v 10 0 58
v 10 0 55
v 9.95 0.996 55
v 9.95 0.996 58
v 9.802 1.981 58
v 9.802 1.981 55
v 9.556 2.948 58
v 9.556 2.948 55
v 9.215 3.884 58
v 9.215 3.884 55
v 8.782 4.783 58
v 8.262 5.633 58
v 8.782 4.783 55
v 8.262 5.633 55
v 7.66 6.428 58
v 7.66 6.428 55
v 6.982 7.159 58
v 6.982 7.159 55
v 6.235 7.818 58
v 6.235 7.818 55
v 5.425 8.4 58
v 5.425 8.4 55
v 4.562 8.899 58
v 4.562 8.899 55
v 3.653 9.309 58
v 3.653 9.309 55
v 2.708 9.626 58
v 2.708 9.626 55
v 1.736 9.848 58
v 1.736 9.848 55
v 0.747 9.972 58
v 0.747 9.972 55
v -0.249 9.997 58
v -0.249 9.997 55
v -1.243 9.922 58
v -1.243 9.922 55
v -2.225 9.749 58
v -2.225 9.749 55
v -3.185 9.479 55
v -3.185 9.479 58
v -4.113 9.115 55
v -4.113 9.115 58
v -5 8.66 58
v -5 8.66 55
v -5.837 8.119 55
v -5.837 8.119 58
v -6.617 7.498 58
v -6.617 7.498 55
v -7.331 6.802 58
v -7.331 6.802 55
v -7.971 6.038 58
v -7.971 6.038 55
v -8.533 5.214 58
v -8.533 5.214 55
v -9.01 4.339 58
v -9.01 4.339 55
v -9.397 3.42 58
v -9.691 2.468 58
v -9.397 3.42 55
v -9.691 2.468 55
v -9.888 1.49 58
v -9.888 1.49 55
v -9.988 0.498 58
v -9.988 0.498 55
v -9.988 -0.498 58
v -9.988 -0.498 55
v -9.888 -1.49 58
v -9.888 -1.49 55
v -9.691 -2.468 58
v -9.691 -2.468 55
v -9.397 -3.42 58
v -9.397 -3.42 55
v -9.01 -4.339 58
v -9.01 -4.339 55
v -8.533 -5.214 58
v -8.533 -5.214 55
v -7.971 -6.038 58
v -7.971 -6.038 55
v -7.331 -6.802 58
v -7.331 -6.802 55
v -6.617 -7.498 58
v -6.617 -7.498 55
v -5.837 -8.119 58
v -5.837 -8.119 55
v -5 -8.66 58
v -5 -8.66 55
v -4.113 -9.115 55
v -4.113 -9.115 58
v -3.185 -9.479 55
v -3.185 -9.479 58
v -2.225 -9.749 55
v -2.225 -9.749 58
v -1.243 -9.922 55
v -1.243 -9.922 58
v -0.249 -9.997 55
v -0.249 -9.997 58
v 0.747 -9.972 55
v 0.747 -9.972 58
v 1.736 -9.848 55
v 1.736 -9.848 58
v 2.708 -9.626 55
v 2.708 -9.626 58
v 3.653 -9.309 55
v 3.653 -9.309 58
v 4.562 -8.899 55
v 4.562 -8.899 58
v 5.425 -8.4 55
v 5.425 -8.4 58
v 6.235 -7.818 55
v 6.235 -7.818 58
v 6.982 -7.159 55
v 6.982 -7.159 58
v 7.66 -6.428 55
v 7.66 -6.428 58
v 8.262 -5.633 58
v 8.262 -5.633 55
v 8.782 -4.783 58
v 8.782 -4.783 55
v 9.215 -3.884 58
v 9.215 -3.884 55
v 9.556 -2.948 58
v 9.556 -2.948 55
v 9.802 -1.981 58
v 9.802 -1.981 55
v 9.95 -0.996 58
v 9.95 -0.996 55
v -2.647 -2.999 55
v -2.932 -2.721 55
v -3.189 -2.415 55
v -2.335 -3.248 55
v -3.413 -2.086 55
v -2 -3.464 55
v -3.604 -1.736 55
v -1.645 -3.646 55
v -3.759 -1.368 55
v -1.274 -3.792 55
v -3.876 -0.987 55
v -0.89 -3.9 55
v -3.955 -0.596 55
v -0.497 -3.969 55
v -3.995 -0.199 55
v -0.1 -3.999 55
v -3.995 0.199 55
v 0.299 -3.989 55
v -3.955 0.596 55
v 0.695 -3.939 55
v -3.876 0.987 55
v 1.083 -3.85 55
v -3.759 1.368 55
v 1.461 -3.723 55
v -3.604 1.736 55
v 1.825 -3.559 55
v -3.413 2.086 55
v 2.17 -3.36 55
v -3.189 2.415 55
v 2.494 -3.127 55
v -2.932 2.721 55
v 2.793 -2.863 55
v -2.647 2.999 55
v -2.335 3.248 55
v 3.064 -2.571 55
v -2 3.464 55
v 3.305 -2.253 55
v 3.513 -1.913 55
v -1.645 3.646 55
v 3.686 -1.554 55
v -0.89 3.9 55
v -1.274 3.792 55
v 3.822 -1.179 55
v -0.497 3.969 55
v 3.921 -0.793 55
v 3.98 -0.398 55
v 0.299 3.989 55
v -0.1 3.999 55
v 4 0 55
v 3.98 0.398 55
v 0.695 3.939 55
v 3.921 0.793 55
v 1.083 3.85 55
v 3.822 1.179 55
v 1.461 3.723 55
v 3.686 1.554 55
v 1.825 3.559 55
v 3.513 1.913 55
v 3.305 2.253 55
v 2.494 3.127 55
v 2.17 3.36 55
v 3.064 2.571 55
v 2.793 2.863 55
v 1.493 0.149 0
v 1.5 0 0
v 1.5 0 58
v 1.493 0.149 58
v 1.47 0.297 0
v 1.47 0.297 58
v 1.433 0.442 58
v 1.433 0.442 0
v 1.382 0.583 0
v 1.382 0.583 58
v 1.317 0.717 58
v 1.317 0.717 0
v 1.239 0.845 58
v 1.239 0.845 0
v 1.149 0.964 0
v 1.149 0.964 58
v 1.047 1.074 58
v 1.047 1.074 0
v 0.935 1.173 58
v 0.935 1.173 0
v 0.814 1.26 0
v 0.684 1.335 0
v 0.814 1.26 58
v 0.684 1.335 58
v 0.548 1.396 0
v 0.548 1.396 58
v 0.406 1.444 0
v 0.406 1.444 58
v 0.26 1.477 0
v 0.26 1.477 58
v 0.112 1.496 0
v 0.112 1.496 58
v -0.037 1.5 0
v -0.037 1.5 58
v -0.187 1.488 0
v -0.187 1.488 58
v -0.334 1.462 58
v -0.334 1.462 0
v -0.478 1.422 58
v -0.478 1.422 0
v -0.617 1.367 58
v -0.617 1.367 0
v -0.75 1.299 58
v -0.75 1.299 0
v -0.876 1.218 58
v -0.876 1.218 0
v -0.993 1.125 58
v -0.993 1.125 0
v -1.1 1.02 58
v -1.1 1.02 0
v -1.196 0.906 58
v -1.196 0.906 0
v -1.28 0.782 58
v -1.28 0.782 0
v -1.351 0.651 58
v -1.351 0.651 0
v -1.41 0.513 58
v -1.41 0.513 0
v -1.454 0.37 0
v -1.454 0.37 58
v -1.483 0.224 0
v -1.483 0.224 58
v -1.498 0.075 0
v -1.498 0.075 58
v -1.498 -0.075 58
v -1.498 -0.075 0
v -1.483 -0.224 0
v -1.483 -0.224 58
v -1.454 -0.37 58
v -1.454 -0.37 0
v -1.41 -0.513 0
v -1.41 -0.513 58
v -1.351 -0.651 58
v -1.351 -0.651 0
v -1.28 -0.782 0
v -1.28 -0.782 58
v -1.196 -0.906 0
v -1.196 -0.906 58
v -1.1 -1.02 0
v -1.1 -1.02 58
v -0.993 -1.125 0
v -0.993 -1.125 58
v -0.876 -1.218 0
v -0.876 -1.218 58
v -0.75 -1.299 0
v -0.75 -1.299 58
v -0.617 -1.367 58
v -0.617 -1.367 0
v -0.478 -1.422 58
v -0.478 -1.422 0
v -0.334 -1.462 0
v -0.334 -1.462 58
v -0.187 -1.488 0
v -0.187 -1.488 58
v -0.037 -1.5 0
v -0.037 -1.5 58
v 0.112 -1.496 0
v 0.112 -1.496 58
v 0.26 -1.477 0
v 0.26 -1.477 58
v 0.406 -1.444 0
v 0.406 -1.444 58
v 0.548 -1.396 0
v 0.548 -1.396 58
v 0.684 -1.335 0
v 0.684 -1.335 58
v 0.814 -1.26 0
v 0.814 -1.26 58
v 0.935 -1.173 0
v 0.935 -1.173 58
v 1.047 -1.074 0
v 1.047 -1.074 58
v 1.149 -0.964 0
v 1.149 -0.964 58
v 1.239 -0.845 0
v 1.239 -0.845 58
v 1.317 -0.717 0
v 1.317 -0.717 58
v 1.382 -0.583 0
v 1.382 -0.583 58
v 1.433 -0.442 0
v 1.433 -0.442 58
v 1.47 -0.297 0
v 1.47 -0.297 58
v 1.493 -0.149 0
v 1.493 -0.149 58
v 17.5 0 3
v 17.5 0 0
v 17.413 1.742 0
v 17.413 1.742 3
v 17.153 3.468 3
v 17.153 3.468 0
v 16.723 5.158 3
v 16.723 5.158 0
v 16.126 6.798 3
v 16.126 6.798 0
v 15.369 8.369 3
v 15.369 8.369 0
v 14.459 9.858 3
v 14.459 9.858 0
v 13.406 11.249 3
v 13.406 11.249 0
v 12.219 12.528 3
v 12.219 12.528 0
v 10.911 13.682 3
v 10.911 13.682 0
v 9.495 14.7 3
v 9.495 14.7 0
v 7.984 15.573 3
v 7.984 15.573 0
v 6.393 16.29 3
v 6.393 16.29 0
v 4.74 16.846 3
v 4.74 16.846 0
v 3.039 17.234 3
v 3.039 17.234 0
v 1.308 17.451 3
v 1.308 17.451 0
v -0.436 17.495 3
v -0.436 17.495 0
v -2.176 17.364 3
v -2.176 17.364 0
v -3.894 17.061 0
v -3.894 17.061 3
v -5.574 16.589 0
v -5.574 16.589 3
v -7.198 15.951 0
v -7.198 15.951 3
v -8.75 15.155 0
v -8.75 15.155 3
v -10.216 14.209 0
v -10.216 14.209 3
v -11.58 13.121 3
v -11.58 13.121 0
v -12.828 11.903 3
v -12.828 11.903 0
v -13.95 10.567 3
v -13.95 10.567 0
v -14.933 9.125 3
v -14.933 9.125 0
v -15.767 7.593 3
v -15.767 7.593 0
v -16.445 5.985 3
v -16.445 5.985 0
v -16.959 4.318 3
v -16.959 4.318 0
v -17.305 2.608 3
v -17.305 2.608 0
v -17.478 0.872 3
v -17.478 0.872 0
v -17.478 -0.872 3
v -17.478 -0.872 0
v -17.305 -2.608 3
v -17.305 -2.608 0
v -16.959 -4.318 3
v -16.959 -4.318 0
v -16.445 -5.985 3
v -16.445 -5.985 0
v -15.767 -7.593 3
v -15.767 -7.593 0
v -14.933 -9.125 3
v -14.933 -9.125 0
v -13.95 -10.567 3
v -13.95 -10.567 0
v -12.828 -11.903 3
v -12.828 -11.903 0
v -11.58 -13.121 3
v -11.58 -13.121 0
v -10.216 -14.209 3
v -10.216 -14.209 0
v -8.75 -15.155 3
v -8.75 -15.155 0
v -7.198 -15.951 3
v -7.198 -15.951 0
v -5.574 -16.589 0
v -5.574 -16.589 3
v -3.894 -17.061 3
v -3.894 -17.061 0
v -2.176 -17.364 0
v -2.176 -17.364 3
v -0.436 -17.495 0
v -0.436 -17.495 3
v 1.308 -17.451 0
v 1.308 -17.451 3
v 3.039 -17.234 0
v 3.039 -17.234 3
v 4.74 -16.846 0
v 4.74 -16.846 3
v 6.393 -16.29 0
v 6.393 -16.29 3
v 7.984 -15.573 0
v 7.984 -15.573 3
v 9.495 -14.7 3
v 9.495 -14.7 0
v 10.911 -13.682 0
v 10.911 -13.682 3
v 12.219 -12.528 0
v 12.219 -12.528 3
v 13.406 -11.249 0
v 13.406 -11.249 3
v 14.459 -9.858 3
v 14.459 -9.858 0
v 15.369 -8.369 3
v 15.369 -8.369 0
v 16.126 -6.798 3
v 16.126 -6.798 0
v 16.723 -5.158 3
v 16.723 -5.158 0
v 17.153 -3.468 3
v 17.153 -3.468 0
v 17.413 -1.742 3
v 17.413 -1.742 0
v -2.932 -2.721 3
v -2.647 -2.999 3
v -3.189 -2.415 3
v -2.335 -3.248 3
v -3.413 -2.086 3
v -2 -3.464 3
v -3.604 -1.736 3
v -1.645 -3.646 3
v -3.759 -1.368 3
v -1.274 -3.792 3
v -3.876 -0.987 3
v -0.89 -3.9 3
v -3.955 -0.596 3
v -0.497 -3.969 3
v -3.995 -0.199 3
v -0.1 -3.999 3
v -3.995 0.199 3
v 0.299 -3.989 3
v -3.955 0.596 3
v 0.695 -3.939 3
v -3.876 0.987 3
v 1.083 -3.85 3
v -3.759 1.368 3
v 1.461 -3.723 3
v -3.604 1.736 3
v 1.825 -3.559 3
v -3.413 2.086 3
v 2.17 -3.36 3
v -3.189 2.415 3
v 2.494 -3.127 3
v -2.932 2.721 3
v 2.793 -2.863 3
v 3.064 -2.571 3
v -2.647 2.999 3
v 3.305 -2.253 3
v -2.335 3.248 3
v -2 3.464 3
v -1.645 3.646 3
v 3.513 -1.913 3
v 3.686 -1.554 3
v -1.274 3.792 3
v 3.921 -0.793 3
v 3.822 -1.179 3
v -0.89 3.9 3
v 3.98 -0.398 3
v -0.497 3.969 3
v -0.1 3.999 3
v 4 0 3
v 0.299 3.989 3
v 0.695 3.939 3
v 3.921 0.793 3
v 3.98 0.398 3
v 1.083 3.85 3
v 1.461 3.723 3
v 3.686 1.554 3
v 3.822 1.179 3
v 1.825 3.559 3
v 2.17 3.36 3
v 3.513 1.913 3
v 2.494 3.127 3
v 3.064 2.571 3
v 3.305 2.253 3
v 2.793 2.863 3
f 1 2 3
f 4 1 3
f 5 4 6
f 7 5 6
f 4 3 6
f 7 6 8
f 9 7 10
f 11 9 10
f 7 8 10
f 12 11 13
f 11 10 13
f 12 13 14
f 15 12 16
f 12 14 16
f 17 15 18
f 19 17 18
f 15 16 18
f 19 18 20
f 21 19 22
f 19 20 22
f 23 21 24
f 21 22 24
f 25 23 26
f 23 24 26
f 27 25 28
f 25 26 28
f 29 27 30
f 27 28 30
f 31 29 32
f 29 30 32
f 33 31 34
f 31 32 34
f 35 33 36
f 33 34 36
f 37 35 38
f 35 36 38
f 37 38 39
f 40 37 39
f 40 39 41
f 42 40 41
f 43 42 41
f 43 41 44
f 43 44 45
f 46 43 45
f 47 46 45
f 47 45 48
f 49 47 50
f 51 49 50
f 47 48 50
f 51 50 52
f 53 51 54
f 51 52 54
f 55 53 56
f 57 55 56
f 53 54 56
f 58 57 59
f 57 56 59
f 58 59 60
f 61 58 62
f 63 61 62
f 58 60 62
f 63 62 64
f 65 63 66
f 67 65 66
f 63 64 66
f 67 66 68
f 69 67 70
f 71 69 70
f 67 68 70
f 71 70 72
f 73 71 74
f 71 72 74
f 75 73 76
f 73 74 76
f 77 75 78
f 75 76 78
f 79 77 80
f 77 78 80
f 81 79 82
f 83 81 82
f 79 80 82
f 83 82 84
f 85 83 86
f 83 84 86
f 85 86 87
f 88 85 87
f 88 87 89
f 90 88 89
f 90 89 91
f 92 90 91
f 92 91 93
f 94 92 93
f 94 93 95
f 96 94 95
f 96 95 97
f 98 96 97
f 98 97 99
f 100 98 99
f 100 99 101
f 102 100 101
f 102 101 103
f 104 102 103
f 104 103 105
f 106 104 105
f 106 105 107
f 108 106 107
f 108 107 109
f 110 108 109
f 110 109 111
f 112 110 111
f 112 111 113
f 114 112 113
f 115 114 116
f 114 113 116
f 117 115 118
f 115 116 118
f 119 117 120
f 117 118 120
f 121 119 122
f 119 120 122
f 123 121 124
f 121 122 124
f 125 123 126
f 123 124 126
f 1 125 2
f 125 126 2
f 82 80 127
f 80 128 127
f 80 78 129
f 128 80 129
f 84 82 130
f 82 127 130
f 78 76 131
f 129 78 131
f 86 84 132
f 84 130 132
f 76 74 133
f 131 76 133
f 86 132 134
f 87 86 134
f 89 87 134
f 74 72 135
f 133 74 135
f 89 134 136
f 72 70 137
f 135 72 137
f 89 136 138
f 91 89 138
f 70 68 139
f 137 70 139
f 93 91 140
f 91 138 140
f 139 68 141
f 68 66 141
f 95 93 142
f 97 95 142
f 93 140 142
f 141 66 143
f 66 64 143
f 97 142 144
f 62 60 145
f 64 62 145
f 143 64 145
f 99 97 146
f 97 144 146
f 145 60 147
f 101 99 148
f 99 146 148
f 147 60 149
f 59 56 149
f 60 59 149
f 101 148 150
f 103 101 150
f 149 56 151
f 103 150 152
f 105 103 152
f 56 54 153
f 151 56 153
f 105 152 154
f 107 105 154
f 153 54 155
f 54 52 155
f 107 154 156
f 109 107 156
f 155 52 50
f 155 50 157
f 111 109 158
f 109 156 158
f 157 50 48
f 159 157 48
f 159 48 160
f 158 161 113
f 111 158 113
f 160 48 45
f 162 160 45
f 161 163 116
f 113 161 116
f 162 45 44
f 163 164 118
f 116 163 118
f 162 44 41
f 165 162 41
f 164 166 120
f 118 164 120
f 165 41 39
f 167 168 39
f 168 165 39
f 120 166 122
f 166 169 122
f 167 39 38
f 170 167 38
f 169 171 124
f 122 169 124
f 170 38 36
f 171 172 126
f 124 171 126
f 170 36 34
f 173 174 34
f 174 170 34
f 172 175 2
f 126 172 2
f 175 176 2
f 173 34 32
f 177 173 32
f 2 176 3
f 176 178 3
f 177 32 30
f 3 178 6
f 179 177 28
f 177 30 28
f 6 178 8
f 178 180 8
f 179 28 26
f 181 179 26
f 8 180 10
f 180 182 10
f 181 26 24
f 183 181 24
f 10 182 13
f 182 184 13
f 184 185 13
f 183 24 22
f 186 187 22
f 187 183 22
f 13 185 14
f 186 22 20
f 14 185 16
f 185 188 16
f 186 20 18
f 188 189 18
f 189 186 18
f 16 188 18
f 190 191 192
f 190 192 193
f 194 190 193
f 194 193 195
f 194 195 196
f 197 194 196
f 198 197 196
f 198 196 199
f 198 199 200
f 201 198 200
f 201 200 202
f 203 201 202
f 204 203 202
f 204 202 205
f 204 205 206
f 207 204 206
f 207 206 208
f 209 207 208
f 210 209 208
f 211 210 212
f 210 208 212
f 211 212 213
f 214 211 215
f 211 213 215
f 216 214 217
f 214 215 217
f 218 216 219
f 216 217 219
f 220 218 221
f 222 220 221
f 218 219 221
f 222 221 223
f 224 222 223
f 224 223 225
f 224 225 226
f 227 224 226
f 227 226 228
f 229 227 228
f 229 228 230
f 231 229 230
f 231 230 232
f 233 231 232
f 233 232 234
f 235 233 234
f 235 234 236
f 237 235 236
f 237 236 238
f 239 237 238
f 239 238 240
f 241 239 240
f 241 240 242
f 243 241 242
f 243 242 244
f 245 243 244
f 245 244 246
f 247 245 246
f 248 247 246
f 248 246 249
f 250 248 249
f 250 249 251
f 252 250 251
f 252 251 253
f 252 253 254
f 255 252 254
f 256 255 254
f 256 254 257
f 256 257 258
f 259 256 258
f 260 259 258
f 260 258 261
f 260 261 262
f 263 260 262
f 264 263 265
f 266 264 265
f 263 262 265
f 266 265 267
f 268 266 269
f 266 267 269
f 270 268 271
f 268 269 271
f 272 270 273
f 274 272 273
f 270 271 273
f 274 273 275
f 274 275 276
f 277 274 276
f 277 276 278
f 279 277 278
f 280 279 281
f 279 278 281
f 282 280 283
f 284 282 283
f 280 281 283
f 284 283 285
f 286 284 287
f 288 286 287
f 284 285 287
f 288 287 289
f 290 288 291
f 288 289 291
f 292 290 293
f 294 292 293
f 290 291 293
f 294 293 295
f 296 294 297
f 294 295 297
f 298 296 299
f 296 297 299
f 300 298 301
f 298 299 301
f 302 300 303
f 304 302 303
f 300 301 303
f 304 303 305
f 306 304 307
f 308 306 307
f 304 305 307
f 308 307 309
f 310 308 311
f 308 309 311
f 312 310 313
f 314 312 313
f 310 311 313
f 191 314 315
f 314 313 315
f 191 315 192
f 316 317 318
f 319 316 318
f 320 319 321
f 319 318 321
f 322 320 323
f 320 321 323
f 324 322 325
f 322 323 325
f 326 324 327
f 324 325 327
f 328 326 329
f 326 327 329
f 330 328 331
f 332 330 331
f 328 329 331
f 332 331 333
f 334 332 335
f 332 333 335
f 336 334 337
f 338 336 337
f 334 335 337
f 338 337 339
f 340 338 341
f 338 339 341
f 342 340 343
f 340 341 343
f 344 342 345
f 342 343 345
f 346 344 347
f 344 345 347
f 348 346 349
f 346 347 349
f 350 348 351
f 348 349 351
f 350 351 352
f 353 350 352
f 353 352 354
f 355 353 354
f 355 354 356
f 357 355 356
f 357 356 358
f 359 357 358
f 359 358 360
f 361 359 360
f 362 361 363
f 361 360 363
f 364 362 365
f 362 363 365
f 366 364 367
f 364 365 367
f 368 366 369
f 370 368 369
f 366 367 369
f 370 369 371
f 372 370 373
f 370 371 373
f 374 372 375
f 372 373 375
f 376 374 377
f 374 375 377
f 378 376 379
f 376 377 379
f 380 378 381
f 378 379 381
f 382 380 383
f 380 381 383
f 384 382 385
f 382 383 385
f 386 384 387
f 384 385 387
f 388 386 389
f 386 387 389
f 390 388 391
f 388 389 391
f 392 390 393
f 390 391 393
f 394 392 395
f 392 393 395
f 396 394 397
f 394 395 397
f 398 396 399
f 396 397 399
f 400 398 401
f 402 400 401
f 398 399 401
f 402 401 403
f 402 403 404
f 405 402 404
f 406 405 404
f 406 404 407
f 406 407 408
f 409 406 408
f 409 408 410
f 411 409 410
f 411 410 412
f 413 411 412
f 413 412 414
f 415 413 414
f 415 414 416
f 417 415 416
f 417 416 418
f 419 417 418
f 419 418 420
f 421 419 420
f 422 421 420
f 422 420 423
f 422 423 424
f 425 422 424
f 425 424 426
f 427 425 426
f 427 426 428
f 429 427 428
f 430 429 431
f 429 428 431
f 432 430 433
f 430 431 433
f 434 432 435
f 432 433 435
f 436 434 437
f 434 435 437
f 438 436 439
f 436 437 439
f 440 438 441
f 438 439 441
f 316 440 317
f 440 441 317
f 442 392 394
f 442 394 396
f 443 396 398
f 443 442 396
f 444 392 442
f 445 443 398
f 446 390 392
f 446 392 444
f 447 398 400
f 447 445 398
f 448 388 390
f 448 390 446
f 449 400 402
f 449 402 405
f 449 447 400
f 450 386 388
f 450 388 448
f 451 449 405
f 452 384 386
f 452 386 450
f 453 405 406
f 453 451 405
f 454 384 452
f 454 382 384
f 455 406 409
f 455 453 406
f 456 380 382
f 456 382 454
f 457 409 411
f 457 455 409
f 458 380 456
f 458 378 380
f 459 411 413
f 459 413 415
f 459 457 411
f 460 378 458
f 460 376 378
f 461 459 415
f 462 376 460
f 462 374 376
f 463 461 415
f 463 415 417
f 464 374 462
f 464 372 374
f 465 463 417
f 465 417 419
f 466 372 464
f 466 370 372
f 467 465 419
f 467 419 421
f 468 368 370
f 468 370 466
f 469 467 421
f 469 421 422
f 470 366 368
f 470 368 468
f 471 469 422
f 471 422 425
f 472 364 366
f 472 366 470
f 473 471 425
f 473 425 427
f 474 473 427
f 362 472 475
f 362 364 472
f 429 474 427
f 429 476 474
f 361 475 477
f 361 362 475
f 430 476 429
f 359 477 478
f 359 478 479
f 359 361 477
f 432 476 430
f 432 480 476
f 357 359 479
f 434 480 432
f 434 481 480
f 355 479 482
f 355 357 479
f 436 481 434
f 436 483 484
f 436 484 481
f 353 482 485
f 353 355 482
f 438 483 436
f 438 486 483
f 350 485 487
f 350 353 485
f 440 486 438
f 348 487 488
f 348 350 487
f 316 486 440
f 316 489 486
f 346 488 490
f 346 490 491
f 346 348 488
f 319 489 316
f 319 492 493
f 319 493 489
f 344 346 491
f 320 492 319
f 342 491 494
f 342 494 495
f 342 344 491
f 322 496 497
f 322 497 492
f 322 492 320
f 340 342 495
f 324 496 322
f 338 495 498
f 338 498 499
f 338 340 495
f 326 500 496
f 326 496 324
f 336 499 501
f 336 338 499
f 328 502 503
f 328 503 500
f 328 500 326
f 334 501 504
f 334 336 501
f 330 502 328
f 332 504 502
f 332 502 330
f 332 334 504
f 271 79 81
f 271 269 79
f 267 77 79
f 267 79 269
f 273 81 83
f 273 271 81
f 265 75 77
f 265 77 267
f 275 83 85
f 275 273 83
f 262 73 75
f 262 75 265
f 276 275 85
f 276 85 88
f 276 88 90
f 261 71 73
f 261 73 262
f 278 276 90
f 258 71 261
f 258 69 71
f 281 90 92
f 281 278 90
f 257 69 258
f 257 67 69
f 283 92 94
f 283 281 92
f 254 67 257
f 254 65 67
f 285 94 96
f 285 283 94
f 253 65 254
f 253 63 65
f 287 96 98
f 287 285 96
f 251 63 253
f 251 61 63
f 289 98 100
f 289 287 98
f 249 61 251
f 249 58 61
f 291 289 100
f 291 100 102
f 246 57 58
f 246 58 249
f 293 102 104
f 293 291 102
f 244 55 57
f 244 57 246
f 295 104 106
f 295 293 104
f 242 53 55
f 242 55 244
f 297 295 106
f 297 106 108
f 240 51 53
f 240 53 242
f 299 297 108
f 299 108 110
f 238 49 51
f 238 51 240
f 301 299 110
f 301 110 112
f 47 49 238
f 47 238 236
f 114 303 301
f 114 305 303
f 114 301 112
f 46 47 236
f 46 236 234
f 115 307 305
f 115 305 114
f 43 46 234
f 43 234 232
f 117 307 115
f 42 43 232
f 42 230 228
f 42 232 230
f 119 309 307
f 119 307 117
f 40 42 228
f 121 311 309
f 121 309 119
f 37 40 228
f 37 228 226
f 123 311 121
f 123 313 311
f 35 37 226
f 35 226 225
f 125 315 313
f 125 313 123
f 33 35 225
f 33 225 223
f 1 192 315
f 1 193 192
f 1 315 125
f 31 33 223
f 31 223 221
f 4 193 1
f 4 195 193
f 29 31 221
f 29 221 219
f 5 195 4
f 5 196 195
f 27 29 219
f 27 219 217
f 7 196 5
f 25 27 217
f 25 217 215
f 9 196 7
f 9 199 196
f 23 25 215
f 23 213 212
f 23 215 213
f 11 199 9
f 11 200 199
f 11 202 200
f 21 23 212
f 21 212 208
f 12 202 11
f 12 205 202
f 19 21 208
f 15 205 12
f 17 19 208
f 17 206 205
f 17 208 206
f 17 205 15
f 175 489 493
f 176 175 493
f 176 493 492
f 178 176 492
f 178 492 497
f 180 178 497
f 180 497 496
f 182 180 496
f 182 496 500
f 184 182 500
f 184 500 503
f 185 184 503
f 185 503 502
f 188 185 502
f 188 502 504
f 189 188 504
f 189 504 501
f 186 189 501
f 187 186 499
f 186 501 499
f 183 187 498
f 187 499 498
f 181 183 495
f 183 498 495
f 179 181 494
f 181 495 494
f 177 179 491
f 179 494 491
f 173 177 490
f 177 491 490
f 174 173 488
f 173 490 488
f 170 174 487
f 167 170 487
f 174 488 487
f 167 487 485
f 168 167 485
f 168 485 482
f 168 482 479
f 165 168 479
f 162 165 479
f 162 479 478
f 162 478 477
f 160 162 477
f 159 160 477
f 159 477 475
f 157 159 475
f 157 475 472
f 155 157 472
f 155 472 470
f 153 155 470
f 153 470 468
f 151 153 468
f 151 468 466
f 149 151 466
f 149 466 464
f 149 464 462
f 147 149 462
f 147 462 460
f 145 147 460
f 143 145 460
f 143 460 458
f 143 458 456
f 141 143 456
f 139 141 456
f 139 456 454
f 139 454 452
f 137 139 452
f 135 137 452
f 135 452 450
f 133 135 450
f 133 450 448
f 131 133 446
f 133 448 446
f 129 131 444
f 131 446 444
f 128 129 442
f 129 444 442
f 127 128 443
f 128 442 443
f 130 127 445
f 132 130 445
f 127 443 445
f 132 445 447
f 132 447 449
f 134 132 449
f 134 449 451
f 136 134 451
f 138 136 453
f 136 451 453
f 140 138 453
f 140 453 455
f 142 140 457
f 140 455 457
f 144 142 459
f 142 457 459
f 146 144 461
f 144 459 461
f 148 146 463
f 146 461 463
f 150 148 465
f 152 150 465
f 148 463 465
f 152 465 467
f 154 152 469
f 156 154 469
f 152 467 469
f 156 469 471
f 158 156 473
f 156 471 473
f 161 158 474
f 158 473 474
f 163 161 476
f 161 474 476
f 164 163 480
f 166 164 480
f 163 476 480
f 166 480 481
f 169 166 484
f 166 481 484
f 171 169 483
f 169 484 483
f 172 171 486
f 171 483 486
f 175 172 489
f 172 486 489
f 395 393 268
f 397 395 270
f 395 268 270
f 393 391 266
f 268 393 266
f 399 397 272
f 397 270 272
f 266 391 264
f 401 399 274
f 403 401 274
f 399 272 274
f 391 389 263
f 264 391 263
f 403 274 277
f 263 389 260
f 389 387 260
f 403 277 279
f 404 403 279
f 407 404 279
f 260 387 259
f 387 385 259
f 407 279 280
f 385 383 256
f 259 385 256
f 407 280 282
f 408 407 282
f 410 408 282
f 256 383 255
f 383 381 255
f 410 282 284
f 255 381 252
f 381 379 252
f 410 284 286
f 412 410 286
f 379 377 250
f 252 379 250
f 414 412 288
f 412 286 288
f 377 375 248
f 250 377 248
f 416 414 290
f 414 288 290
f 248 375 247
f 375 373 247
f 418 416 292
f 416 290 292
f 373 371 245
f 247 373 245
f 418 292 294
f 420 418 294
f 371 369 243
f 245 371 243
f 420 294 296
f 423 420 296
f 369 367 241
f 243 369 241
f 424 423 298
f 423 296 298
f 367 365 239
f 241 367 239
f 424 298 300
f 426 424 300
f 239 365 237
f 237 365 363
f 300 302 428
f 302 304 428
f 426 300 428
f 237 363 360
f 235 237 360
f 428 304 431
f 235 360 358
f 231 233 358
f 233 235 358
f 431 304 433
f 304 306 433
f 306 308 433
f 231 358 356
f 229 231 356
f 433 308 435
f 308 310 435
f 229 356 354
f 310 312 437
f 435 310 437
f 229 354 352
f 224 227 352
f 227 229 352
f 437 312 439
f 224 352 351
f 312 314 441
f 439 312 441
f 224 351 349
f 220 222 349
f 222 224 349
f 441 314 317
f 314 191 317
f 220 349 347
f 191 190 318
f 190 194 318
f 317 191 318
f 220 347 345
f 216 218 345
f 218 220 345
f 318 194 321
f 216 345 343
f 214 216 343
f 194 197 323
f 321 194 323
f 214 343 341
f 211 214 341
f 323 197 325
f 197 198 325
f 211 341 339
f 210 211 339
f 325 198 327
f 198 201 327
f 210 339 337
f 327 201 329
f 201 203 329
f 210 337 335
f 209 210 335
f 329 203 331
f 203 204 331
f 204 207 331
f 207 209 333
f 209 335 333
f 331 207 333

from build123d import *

# Parameters (mm, degrees)
F0_R     = 17.5
F0_R_2   = 4
F1_DEPTH = 3
F2_DEPTH = 55
F3_R     = 10
F3_R_2   = 4
F4_DEPTH = 3
F5_R     = 1.5
F6_DEPTH = 58.001


with BuildPart() as f1:
    # F0 (on Top) → F1 (new body)
    with BuildSketch(Plane.XY):
        Circle(F0_R)
        Circle(F0_R_2, mode=Mode.SUBTRACT)
        Circle(F0_R_2)
    extrude(amount=F1_DEPTH)

    # F0 (on Top) → F2 (join)
    with BuildSketch(Plane.XY):
        Circle(F0_R_2)
    extrude(amount=F2_DEPTH)

    # F3 (on face) → F4 (join)
    with BuildSketch(Plane.XY.offset(55)):
        Circle(F3_R)
        Circle(F3_R_2)
    extrude(amount=F4_DEPTH)

    # F5 (on face) → F6 (cut, through all)
    with BuildSketch(Plane.XY.offset(58)):
        Circle(F5_R)
    extrude(amount=-F6_DEPTH, mode=Mode.SUBTRACT)


solid = f1.part
